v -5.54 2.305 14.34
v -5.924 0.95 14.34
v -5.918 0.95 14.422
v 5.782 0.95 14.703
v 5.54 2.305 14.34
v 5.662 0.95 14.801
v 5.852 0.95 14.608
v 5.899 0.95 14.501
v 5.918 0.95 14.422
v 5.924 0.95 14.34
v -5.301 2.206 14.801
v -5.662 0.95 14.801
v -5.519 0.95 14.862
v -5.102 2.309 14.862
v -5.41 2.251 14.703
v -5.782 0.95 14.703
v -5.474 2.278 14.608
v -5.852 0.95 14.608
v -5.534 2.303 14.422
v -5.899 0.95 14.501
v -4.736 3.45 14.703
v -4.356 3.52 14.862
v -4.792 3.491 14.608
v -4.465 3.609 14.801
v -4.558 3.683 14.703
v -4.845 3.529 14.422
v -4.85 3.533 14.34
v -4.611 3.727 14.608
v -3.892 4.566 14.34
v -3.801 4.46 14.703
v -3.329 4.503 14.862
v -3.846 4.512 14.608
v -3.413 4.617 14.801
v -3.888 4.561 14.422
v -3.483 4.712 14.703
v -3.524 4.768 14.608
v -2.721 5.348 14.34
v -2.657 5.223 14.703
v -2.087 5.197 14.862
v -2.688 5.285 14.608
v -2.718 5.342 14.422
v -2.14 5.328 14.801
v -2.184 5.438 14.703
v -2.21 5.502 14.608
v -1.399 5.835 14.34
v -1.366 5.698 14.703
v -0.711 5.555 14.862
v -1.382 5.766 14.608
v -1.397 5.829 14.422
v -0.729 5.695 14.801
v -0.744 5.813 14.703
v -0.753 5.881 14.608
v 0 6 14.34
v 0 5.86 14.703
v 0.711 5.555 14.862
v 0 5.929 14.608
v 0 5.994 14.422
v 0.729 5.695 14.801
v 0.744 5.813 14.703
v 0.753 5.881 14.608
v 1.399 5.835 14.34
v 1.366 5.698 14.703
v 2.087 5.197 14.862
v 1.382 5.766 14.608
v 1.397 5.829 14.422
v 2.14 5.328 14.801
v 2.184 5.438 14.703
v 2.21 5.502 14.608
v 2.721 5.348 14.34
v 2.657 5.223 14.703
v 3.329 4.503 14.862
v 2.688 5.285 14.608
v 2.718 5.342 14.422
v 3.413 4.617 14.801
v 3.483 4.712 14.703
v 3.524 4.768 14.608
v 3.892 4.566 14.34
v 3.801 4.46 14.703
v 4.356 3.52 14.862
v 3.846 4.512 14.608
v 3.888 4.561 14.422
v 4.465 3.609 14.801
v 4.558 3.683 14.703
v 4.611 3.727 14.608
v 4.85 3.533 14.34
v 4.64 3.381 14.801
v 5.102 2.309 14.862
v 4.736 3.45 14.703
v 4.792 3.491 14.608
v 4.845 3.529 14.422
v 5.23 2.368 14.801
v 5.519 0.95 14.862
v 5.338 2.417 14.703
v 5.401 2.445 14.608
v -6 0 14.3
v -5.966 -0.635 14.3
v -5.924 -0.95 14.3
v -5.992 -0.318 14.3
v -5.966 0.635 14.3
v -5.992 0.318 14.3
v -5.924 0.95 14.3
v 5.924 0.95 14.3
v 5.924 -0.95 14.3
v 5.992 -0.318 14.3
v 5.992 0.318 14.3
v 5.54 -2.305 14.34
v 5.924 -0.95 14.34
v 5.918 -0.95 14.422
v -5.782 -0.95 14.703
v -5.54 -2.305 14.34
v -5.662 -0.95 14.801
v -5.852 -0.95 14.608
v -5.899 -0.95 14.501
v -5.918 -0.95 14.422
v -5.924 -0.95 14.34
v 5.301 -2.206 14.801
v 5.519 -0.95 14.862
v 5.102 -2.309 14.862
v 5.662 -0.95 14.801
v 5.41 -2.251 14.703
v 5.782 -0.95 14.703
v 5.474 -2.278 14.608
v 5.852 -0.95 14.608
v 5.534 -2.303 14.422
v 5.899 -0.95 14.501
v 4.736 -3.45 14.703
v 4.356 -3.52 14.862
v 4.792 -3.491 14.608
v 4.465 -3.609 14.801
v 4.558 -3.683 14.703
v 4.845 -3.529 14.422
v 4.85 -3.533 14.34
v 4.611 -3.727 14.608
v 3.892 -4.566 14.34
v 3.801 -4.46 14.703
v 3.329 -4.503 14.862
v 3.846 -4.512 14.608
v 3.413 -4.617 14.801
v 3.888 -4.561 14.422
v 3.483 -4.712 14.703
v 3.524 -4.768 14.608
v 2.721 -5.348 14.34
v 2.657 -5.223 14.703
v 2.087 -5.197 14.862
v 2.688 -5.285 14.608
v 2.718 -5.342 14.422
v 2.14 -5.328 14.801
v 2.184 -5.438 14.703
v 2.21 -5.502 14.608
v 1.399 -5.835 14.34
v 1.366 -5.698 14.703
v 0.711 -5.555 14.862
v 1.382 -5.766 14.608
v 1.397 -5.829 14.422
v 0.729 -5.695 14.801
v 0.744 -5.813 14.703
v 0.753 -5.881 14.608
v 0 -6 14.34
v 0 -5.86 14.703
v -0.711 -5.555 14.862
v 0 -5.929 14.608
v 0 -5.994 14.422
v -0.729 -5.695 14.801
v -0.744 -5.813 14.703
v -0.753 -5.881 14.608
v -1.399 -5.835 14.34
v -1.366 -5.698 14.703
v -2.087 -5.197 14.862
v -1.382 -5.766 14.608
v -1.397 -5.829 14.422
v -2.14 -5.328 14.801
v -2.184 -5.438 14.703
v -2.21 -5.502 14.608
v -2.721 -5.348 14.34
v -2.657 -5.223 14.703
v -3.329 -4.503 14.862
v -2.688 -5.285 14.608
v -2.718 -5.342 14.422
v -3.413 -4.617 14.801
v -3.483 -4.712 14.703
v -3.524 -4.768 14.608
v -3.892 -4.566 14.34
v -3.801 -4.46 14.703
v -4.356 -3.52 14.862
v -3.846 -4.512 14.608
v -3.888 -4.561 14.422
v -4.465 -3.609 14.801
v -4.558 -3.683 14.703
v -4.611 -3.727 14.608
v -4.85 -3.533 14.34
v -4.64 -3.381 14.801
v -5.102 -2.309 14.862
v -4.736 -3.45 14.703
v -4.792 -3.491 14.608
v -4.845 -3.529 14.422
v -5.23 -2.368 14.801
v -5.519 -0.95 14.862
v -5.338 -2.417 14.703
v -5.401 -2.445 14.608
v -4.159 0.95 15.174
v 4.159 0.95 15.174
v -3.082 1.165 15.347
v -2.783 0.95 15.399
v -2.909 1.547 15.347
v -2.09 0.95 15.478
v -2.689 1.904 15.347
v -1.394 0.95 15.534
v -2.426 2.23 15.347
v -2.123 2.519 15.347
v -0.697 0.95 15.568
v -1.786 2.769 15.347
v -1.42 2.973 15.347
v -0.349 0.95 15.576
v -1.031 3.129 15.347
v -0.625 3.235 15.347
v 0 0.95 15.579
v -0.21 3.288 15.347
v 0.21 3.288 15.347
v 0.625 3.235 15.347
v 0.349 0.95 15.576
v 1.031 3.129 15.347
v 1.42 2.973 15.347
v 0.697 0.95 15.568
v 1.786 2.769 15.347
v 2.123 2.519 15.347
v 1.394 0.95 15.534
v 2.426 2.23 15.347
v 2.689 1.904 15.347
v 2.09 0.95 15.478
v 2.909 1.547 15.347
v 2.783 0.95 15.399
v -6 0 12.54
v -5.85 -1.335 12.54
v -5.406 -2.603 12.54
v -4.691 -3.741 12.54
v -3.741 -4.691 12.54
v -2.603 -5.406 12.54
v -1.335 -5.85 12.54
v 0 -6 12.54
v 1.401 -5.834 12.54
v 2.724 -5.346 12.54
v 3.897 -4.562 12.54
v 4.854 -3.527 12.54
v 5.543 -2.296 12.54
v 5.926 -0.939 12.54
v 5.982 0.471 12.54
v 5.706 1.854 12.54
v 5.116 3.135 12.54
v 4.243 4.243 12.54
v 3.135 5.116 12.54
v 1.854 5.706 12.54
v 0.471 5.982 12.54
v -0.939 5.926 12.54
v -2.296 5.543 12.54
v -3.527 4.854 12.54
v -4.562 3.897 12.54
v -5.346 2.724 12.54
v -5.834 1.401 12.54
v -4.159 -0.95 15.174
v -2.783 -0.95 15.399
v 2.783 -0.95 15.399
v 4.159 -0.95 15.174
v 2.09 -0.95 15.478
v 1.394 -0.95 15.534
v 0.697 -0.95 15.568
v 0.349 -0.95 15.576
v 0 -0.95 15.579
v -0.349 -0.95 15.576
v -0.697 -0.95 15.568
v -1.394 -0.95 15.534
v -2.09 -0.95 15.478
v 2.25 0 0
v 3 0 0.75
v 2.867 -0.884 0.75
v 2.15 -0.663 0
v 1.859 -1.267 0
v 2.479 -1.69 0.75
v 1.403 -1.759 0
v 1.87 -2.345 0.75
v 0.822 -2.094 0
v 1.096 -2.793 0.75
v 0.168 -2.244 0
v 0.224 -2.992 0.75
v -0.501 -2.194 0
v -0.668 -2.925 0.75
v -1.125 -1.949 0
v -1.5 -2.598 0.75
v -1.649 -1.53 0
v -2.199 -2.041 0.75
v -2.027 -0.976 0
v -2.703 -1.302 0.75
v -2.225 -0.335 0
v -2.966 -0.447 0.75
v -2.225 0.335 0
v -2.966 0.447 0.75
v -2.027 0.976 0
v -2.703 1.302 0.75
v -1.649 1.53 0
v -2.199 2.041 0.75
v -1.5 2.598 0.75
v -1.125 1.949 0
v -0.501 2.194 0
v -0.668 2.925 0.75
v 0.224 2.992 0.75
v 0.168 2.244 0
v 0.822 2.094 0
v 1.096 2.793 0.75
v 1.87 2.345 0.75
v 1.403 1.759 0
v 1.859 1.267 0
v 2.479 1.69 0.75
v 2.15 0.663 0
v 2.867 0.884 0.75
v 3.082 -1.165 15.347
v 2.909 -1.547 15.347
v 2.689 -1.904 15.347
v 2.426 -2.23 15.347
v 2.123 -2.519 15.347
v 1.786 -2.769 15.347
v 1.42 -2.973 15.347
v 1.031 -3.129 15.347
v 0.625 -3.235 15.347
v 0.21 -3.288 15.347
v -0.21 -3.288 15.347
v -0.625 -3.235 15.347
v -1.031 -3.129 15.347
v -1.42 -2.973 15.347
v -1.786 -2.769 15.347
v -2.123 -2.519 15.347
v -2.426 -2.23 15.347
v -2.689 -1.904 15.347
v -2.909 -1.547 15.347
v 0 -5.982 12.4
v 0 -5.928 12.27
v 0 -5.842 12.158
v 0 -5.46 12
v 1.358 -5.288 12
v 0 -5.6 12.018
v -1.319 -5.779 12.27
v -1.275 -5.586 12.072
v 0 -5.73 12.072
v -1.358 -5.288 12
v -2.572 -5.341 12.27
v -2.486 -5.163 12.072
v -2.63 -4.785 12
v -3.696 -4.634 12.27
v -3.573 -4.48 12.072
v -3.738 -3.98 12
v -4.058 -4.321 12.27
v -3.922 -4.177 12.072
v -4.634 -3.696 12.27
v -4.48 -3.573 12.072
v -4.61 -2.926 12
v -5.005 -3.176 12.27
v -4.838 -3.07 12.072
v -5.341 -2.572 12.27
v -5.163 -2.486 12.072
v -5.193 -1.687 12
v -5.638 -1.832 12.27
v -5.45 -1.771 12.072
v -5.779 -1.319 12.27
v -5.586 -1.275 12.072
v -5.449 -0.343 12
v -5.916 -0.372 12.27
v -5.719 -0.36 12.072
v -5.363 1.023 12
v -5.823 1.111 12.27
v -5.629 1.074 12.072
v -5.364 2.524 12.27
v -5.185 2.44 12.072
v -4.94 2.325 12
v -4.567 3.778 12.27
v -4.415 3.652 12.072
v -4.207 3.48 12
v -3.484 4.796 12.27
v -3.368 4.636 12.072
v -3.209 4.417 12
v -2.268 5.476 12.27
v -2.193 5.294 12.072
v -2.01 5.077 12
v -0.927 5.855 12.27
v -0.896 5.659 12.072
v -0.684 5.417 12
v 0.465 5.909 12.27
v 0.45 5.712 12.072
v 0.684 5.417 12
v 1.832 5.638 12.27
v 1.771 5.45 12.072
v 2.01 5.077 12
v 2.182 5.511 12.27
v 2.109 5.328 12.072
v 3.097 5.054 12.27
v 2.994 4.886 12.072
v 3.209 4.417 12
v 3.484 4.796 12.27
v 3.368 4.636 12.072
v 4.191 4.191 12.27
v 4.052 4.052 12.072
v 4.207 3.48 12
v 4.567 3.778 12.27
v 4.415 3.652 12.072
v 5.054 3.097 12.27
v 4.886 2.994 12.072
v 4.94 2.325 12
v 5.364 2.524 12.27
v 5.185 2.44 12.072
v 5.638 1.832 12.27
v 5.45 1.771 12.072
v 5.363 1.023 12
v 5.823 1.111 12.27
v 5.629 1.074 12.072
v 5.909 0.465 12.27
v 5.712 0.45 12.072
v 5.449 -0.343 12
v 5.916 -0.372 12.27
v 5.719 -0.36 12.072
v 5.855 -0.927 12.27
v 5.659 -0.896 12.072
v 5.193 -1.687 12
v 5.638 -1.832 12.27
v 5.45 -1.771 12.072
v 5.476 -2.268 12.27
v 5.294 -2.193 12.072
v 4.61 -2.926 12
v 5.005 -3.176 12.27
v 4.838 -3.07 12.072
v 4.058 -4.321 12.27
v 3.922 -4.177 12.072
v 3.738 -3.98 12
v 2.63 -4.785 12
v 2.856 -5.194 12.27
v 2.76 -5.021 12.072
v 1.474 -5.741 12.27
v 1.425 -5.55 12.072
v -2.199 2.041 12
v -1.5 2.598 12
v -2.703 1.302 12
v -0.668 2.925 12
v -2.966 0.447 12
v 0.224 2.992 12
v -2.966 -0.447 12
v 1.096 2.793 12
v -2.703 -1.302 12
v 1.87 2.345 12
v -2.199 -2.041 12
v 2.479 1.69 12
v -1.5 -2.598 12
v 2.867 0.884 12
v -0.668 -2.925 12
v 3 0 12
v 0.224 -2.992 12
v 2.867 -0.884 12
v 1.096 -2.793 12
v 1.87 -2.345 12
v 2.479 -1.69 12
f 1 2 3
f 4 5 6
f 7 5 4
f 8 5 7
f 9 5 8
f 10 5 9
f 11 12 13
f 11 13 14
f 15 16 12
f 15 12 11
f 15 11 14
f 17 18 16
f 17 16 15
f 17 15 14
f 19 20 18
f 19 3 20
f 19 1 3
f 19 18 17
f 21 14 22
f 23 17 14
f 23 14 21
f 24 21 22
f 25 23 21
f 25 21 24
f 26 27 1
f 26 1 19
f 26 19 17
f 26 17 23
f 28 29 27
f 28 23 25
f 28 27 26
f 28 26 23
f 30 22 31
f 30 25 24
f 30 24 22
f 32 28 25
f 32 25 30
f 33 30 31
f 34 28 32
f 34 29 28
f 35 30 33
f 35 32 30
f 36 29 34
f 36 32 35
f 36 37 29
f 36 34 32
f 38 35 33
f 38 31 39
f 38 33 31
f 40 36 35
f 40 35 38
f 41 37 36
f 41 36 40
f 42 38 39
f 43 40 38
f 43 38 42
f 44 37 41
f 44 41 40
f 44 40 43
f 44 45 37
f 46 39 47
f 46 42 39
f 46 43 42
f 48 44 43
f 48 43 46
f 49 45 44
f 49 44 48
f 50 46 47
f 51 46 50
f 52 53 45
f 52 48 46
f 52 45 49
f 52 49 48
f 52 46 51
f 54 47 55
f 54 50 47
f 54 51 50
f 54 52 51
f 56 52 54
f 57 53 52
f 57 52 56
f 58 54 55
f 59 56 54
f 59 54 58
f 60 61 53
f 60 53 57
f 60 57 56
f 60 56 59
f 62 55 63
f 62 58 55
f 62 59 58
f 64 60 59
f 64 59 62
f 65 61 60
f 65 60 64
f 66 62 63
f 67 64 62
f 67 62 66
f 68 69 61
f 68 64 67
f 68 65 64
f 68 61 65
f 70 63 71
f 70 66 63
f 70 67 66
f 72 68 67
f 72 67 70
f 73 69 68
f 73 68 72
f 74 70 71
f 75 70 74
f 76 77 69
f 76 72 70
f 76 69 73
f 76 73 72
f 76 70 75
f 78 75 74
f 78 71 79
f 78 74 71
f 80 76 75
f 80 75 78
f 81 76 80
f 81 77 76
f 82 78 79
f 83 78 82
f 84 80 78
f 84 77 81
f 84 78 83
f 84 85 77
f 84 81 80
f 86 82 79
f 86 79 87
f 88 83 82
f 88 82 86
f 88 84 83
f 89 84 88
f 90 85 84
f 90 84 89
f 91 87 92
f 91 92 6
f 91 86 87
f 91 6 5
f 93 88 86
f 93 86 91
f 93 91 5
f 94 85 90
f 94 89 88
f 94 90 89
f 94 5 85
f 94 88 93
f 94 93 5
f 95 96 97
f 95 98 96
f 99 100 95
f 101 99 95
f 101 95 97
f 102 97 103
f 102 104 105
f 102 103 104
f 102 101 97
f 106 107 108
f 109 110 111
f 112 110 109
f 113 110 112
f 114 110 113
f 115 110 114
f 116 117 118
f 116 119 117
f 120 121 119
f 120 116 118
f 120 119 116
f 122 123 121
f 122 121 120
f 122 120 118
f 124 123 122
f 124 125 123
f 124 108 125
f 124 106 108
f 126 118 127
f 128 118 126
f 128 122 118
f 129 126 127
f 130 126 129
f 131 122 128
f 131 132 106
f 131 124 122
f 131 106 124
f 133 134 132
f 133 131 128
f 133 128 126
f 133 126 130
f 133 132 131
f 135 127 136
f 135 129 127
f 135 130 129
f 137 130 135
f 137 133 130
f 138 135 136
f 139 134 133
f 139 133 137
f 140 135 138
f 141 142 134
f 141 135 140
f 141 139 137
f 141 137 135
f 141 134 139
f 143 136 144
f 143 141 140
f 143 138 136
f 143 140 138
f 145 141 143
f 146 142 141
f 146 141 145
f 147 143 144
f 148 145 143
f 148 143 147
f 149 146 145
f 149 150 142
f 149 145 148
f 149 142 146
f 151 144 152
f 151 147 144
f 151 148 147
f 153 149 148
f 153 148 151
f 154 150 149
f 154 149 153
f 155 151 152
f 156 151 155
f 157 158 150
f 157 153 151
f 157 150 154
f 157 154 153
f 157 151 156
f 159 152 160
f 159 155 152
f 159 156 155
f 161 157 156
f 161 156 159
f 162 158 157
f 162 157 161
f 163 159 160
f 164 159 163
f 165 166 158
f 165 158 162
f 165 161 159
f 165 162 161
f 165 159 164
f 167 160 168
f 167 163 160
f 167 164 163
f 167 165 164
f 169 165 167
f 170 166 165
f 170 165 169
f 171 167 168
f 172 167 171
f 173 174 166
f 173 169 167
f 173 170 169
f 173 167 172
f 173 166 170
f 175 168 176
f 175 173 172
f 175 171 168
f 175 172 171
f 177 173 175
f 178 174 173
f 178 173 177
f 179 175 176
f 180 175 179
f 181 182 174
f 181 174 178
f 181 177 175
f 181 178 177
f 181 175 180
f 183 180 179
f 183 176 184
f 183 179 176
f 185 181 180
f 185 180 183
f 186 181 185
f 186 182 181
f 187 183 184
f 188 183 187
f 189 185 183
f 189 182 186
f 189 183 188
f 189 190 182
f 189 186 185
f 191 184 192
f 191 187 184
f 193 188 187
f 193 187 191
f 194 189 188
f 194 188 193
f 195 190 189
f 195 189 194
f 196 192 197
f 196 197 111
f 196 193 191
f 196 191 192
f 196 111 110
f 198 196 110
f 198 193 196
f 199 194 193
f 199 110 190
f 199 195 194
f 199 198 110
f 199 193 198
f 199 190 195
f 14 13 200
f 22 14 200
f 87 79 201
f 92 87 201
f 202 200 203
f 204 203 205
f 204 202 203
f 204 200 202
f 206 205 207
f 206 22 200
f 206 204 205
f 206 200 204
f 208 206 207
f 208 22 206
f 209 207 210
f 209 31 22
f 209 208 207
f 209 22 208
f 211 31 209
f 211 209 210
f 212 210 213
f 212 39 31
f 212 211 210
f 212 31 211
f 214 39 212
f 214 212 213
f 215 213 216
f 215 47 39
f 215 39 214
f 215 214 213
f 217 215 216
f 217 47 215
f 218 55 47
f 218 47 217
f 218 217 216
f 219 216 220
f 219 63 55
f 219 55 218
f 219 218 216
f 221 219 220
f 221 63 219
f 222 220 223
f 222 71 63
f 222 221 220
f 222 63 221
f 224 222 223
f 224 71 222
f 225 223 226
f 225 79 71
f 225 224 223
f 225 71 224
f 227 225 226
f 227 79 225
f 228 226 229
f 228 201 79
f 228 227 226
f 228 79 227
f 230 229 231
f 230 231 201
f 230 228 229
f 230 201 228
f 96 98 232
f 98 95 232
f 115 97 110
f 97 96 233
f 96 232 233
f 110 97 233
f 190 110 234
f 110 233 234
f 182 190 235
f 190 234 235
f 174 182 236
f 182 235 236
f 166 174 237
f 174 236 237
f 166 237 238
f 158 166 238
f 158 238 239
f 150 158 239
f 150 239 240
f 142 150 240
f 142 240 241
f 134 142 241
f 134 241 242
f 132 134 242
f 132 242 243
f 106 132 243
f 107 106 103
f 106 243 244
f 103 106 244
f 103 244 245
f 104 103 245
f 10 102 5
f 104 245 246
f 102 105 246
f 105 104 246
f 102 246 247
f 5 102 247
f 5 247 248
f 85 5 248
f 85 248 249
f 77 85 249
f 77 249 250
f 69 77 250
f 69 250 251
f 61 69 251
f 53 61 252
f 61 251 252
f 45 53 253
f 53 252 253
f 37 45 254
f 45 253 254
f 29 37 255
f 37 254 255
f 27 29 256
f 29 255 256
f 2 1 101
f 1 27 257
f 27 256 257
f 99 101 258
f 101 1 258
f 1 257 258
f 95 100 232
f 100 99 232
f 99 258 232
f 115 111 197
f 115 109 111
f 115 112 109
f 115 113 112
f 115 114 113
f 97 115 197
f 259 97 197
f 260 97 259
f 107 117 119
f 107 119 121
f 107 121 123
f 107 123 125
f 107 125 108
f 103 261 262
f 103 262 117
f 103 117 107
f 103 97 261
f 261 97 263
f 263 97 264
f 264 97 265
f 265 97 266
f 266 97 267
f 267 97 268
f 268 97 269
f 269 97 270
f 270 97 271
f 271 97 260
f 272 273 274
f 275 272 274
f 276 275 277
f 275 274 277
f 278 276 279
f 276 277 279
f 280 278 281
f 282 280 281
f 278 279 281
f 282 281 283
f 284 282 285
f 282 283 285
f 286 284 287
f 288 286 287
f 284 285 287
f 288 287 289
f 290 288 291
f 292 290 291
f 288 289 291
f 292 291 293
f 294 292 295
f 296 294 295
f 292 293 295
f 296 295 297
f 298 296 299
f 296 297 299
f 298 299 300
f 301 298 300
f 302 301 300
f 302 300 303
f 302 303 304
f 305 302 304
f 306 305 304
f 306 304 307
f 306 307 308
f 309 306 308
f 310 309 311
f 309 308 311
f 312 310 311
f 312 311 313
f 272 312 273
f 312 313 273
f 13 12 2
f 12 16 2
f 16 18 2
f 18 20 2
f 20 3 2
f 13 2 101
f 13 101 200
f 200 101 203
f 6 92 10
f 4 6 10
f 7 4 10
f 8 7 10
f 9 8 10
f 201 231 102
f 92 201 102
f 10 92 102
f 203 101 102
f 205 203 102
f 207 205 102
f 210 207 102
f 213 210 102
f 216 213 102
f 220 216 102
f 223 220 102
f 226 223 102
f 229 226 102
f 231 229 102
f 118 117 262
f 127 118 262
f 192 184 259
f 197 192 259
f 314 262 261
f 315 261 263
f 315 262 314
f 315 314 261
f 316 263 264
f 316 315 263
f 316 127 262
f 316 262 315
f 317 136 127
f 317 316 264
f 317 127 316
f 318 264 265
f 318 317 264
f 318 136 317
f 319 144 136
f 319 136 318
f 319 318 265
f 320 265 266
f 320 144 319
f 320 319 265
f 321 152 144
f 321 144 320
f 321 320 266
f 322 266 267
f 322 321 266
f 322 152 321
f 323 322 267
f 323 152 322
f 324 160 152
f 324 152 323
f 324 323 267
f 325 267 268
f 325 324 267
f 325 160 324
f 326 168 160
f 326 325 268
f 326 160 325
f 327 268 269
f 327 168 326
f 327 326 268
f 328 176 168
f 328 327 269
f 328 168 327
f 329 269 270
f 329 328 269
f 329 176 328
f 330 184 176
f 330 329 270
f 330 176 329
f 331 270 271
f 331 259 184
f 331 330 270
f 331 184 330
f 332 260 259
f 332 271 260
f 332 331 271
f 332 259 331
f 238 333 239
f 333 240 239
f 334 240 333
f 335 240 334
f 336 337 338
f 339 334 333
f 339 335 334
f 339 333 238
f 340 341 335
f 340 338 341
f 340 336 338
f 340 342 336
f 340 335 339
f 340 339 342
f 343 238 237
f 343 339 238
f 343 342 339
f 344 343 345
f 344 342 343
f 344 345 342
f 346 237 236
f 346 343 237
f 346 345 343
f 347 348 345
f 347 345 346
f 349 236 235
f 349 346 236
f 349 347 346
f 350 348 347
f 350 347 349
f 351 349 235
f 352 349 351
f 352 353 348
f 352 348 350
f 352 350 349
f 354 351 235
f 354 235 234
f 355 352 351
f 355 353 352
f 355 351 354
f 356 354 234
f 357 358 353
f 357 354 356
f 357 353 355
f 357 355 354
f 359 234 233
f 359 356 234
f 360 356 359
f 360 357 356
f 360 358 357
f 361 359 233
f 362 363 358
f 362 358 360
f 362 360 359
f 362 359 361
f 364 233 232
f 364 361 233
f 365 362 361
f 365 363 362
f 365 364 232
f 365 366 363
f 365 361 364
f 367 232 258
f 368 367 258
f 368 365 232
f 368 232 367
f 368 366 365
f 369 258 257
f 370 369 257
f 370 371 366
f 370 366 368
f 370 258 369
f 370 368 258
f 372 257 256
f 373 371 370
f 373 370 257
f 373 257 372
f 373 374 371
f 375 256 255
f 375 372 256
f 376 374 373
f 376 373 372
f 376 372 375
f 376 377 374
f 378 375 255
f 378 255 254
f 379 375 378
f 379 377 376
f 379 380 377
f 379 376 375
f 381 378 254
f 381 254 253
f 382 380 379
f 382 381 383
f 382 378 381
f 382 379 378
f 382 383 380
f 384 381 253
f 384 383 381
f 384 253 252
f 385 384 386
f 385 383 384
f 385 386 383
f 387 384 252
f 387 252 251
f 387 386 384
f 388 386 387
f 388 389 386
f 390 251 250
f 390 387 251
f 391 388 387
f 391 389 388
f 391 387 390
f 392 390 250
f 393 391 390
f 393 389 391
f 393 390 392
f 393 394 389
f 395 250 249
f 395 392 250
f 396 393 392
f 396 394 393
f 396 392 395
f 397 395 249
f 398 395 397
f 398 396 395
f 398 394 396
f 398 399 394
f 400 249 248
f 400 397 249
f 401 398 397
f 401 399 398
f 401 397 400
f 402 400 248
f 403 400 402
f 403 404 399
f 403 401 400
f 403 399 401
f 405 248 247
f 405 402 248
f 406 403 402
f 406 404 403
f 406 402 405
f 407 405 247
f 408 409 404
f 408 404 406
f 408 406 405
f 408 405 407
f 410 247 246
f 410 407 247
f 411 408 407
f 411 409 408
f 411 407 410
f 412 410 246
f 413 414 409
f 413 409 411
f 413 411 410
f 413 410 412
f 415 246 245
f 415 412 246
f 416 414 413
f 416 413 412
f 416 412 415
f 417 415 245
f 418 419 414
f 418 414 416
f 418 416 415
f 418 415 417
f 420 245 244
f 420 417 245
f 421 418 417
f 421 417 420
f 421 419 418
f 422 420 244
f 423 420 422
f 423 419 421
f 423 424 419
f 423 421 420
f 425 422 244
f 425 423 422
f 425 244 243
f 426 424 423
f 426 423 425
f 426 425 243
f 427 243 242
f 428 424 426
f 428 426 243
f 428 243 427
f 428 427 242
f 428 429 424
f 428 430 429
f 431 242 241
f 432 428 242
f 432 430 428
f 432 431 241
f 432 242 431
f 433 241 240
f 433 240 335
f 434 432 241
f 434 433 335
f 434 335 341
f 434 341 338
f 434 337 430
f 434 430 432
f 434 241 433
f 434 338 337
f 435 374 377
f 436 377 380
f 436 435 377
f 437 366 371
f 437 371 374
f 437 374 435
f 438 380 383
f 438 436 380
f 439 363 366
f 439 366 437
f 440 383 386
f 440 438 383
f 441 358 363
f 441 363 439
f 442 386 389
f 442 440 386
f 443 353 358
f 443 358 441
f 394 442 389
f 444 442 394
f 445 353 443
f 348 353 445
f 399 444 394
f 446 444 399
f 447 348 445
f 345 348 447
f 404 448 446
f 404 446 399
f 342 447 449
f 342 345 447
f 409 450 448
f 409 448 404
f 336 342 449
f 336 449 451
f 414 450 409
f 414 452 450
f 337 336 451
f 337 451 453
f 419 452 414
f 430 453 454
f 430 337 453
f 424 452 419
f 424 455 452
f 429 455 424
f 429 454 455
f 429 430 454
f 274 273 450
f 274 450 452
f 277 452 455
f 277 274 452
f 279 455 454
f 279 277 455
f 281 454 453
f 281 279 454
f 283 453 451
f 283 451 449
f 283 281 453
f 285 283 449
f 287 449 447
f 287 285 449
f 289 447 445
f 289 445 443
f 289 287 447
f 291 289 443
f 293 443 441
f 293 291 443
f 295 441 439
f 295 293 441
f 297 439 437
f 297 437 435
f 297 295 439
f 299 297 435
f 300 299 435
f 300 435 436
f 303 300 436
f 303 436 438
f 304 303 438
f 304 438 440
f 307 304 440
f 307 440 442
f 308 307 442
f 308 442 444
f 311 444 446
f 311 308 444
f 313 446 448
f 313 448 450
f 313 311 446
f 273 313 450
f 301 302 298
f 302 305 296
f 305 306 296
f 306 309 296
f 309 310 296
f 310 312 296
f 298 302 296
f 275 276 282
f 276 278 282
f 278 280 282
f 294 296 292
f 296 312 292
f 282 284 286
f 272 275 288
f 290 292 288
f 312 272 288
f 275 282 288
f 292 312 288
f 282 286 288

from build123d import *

# Parameters (mm, degrees)
SKETCH3_W               = 12
SKETCH3_H               = 3
CHAMFER1_SIZE           = 0.75
SKETCH8_W               = 3.6
SKETCH8_H               = 6
CUT_EXTRUDE_THIN2_START = 14.3
SKETCH12_W              = 12
SKETCH12_H              = 1.9
CUT_EXTRUDE_THIN2_DEPTH = 1.3


with BuildPart() as part:
    # Sketch3 → Revolve1 (revolve)
    with BuildSketch(Plane(origin=(0, 0, 0), x_dir=(0, 0, -1), z_dir=(1, 0, 0)), mode=Mode.PRIVATE) as revolve1_sk:
        with Locations((-6, 1.5)):
            Rectangle(SKETCH3_W, SKETCH3_H)
    revolve(revolve1_sk.sketch.rotate(Axis((0, 0, 0), (0, 0, -1)), 90), axis=Axis((0, 0, 0), (0, 0, -1)))

    # Chamfer1
    chamfer1_edges = [part.edges().sort_by_distance(p)[0] for p in [
        (-3, 0, 0),
    ]]
    chamfer(chamfer1_edges, length=CHAMFER1_SIZE)

    # Sketch8 → Revolve2 (revolve)
    with BuildSketch(Plane(origin=(0, 0, 0), x_dir=(0, 0, -1), z_dir=(1, 0, 0)), mode=Mode.PRIVATE) as revolve2_sk:
        with Locations((-13.8, 3)):
            Rectangle(SKETCH8_W, SKETCH8_H)
    revolve(revolve2_sk.sketch.rotate(Axis((0, 0, 0), (0, 0, 1)), 90), axis=Axis((0, 0, 0), (0, 0, 1)))

    # Sketch11 → Cut-Revolve3 (revolve, cut)
    with BuildSketch(Plane(origin=(0, 0, 0), x_dir=(0, 0, -1), z_dir=(1, 0, 0)), mode=Mode.PRIVATE) as cut_revolve3_sk:
        with BuildLine():
            Line((-14.34, 6), (-12.54, 6))
            ThreePointArc((-12.54, 6), (-12.158162338, 5.841837662), (-12, 5.46))
            Line((-12, 5.46), (-11.365, 5.46))
            Line((-11.365, 5.46), (-11.365, 6.635))
            Line((-11.365, 6.635), (-16.235, 6.635))
            Line((-16.235, 6.635), (-16.235, 0))
            Line((-16.235, 0), (-15.6, 0))
            ThreePointArc((-15.6, 0), (-15.41458949, 2.824231581), (-14.861540653, 5.599983383))
            ThreePointArc((-14.861540653, 5.599983383), (-14.668640361, 5.88848047), (-14.34, 6))
        make_face()
    revolve(cut_revolve3_sk.sketch.rotate(Axis((0, 0, 15.6), (0, 0, -1)), 180), axis=Axis((0, 0, 15.6), (0, 0, -1)), mode=Mode.SUBTRACT)

    # Sketch12 → Cut-Extrude-Thin2 (cut)
    with BuildSketch(Plane.XY.offset(CUT_EXTRUDE_THIN2_START)):
        Rectangle(SKETCH12_W, SKETCH12_H)
    extrude(amount=CUT_EXTRUDE_THIN2_DEPTH, mode=Mode.SUBTRACT)


solid = part.part
